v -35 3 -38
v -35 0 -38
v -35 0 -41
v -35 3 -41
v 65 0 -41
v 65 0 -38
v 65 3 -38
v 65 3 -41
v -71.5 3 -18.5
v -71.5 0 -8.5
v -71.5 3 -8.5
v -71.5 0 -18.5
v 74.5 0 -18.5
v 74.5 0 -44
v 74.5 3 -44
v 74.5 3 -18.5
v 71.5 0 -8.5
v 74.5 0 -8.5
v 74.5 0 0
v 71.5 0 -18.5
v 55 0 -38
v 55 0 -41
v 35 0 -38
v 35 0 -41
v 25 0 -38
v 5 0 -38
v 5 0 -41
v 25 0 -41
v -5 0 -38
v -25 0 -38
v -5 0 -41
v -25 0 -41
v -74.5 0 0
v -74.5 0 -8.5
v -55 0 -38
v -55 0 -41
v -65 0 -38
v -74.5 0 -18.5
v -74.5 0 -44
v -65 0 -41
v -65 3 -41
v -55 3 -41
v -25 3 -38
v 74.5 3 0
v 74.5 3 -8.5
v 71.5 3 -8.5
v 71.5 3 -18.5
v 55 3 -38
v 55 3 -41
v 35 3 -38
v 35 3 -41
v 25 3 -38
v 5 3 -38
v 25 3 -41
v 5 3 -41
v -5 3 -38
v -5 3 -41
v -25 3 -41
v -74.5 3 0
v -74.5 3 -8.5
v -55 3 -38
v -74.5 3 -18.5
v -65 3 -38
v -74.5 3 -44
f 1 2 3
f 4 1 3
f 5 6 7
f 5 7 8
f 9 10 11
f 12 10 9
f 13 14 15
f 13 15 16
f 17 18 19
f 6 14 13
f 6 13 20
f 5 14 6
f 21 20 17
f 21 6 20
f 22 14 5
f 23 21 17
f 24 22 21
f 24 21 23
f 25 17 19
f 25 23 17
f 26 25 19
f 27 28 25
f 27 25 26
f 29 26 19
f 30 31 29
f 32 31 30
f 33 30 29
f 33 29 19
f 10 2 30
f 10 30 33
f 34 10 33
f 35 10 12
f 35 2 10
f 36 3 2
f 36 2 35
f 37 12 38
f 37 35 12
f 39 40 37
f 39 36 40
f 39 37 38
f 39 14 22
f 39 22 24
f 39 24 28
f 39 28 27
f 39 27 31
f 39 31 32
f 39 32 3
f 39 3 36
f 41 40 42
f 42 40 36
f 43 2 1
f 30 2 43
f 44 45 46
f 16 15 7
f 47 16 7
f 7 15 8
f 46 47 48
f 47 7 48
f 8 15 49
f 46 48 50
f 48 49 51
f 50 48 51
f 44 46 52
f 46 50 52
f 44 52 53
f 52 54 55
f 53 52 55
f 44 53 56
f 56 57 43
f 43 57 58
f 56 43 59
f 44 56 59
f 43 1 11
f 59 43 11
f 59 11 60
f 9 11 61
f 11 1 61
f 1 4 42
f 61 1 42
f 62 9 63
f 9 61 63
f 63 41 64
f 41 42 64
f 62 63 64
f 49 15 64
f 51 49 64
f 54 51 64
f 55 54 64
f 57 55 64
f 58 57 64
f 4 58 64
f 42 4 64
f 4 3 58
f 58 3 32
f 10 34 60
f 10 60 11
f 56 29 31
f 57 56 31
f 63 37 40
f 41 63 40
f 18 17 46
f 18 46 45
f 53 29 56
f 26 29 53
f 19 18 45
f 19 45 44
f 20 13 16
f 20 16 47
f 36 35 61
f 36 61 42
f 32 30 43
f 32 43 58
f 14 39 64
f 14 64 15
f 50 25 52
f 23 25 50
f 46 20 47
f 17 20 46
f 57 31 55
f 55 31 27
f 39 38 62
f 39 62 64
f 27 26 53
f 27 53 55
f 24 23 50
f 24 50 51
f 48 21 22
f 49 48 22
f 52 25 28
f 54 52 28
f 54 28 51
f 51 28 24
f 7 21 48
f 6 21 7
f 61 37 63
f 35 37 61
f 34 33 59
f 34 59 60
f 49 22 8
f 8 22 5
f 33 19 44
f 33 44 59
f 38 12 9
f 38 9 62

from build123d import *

# Parameters (mm, degrees)
SKETCH1_W           = 10
SKETCH1_H           = 3
BOSS_EXTRUDE1_DEPTH = 3


with BuildPart() as part:
    # Sketch1 → Boss-Extrude1 (new body)
    with BuildSketch(Plane(origin=(0, 0, 0), x_dir=(1, 0, 0), z_dir=(0, 1, 0))):
        Polygon((-74.5, 44), (74.5, 44), (74.5, 18.5), (71.5, 18.5), (71.5, 8.5), (74.5, 8.5), (74.5, 0), (-74.5, 0), (-74.5, 8.5), (-71.5, 8.5), (-71.5, 18.5), (-74.5, 18.5), align=None)
        with Locations((0, 39.5)):
            Rectangle(SKETCH1_W, SKETCH1_H, mode=Mode.SUBTRACT)
        with Locations((30, 39.5)):
            Rectangle(SKETCH1_W, SKETCH1_H, mode=Mode.SUBTRACT)
        with Locations((60, 39.5)):
            Rectangle(SKETCH1_W, SKETCH1_H, mode=Mode.SUBTRACT)
        with Locations((-60, 39.5)):
            Rectangle(SKETCH1_W, SKETCH1_H, mode=Mode.SUBTRACT)
        with Locations((-30, 39.5)):
            Rectangle(SKETCH1_W, SKETCH1_H, mode=Mode.SUBTRACT)
    extrude(amount=BOSS_EXTRUDE1_DEPTH)


solid = part.part
